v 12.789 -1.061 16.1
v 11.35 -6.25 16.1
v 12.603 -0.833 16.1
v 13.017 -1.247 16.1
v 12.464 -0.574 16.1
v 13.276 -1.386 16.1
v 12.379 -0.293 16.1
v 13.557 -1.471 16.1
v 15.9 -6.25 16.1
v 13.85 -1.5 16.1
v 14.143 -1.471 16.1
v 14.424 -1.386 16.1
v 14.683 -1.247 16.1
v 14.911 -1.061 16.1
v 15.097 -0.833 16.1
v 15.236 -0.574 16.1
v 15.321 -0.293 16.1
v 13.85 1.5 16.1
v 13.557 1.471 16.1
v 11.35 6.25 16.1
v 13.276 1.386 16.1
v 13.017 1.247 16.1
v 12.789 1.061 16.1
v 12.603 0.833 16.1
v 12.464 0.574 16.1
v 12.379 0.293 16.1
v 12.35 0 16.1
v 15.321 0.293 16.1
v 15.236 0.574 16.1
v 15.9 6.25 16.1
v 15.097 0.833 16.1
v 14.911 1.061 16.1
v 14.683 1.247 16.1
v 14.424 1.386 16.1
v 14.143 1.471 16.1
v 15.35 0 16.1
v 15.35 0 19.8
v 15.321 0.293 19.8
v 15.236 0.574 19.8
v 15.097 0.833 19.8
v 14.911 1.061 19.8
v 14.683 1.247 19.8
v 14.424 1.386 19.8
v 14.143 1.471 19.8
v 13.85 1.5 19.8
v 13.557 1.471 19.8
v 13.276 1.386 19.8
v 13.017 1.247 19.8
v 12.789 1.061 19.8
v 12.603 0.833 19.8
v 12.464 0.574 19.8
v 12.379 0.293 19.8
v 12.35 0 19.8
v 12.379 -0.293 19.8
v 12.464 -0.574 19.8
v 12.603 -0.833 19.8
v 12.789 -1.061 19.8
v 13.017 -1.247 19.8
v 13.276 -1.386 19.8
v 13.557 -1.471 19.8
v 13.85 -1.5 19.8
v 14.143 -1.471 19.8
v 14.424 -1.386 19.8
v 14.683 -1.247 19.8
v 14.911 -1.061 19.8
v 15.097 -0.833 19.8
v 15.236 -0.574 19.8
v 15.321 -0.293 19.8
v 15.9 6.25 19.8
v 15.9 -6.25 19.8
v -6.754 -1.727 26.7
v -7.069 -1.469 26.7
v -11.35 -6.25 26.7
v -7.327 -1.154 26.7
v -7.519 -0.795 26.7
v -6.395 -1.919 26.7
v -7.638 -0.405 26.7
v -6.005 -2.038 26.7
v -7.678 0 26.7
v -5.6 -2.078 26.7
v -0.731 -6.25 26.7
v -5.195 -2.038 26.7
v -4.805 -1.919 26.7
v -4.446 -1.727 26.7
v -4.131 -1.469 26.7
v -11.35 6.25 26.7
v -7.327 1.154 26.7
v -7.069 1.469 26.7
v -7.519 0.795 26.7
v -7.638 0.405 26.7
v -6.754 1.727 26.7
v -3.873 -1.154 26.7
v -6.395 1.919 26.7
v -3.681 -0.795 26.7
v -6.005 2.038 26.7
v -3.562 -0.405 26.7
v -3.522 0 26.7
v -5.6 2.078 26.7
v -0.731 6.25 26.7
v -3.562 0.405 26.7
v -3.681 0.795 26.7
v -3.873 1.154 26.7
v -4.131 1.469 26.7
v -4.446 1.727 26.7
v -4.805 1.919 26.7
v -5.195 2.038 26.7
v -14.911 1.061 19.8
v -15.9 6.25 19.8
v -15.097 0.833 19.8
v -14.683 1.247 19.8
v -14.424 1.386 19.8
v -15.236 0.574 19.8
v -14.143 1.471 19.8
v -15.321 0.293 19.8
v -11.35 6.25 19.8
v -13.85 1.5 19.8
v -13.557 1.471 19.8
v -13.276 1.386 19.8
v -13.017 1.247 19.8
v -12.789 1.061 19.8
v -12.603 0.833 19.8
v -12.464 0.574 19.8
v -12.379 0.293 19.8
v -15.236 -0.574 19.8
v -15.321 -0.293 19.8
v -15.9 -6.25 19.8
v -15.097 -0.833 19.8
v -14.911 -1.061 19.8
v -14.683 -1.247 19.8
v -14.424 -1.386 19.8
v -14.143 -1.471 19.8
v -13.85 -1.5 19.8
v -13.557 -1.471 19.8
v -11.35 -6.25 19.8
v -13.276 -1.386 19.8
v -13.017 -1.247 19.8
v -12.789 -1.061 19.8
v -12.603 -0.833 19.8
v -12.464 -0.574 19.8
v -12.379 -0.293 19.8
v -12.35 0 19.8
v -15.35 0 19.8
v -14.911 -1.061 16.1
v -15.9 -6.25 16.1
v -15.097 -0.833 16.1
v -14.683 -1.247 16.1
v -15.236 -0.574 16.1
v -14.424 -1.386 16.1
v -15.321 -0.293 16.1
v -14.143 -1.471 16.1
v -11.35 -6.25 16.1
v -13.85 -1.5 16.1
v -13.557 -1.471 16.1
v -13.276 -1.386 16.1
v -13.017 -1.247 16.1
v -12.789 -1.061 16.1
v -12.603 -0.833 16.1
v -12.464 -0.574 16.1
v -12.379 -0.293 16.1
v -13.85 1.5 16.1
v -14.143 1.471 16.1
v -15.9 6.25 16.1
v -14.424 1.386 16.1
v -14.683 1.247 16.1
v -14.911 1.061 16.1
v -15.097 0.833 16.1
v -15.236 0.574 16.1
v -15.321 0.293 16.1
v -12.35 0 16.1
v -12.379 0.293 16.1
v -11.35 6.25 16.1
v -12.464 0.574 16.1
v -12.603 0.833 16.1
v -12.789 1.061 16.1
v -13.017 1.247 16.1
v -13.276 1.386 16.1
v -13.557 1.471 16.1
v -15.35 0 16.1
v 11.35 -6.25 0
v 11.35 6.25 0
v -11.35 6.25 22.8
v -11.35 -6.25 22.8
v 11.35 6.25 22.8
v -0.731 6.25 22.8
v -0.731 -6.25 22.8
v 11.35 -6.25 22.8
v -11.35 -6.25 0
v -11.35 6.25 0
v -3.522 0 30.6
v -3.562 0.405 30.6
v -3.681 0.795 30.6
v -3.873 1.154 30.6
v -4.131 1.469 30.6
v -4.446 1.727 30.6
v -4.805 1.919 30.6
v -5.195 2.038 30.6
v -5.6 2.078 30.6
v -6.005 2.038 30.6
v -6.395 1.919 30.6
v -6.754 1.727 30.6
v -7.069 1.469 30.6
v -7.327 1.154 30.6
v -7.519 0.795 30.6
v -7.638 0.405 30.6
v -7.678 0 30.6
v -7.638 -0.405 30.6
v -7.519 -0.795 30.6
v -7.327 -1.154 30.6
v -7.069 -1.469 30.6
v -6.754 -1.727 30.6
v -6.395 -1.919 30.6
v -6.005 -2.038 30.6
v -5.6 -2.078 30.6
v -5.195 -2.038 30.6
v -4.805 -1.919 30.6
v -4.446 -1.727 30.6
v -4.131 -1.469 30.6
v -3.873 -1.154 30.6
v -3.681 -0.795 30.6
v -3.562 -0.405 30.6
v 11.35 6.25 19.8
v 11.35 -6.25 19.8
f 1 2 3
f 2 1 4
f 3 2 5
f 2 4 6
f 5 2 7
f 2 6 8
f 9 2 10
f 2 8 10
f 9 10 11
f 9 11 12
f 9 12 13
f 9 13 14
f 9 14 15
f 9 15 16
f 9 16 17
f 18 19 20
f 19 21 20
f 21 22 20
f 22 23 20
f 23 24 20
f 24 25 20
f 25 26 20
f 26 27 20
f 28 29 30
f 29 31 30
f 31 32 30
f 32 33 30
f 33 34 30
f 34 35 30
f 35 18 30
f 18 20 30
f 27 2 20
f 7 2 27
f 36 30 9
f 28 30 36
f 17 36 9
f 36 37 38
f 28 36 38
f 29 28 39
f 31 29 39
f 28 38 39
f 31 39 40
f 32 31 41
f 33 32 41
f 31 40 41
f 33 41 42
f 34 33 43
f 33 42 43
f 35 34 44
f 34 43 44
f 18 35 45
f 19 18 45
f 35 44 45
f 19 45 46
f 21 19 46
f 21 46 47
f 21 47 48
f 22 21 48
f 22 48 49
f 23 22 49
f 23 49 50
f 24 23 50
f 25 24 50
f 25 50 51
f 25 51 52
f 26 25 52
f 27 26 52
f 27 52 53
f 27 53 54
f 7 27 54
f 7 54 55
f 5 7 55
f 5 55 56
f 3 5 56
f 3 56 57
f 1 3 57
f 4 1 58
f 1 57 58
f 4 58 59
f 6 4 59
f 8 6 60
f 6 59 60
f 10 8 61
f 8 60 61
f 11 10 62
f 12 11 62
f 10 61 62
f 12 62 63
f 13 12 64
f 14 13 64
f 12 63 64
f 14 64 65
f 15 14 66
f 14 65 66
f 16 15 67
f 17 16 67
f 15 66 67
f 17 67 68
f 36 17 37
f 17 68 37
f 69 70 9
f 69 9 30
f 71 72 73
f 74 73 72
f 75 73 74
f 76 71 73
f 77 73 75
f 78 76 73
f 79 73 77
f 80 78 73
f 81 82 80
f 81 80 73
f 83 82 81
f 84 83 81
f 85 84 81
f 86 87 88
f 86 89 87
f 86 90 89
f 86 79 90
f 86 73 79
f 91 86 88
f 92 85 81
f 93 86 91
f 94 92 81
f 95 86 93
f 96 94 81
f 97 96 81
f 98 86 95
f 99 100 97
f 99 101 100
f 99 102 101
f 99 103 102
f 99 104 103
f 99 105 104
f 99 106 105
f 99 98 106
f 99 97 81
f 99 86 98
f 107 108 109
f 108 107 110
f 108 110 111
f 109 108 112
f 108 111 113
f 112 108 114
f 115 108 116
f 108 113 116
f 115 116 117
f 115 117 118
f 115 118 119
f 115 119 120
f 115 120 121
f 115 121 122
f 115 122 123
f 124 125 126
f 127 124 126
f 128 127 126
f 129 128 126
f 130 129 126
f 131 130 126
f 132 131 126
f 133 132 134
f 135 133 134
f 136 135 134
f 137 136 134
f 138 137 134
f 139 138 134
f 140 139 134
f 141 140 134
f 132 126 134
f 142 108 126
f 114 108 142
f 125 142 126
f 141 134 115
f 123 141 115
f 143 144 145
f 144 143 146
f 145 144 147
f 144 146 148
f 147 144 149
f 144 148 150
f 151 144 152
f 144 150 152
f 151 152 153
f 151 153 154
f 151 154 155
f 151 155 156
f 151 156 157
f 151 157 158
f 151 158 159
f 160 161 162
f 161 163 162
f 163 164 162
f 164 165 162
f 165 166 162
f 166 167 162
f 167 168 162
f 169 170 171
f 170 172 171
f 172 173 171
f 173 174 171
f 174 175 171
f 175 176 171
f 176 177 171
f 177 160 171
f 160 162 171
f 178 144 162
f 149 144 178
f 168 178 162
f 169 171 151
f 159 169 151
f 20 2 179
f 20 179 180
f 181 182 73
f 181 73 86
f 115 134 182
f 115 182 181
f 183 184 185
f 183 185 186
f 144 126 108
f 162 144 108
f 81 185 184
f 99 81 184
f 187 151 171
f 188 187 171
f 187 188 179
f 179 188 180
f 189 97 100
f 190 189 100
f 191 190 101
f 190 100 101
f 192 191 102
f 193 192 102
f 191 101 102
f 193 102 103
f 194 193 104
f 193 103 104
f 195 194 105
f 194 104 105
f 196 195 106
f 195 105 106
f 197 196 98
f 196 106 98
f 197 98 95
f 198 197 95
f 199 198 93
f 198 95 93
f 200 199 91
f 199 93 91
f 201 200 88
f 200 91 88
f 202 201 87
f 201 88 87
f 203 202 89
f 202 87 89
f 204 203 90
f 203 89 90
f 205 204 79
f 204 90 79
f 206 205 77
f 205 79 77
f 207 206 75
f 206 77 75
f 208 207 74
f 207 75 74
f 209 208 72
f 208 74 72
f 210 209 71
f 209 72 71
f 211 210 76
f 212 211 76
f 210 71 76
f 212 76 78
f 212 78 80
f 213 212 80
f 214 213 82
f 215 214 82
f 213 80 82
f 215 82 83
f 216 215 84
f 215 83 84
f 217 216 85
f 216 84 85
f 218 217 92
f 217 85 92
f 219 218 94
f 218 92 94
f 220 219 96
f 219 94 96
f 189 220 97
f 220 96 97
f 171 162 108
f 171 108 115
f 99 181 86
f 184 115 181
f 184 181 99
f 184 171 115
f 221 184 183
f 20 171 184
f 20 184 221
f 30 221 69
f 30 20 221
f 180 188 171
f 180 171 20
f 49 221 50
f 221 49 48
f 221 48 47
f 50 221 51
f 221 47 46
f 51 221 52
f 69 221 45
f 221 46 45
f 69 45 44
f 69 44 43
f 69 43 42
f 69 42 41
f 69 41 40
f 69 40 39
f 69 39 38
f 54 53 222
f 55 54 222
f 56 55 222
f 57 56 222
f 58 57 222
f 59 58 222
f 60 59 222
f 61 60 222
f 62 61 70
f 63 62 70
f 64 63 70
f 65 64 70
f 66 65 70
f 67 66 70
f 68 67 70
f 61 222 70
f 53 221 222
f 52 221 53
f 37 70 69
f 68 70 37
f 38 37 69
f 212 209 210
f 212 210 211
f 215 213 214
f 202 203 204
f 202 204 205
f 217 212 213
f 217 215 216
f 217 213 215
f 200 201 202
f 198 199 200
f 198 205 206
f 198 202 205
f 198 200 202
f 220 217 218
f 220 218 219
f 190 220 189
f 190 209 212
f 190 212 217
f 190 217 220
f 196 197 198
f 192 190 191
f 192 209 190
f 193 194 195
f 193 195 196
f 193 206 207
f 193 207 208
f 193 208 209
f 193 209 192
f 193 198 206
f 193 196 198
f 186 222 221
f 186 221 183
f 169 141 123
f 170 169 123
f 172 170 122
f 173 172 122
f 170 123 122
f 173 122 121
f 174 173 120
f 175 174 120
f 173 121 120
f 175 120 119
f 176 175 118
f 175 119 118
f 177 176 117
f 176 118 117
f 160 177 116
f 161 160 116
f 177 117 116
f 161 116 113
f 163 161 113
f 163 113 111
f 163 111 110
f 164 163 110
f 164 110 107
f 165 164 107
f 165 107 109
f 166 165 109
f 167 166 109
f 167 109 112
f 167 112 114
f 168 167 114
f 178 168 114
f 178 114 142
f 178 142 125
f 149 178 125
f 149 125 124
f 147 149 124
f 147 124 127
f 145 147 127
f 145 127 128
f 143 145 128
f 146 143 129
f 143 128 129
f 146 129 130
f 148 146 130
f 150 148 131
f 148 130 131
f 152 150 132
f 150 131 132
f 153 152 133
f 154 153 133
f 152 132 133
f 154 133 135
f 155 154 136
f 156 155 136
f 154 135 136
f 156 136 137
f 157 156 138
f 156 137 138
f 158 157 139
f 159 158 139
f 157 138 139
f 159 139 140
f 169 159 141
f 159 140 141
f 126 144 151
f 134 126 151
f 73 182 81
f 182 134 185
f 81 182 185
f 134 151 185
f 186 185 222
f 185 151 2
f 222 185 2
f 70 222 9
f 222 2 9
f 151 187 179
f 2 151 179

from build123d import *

# Parameters (mm, degrees)
SKETCH1_W           = 22.7
SKETCH1_H           = 12.5
BOSS_EXTRUDE1_DEPTH = 22.8
SKETCH2_W           = 4.55
SKETCH2_H           = 12.5
BOSS_EXTRUDE2_DEPTH = 6.7
SKETCH3_W           = 4.55
SKETCH3_H           = 3
CUT_EXTRUDE1_DEPTH  = 13.5
SKETCH4_R           = 1.5
CUT_EXTRUDE2_DEPTH  = 16.1
SKETCH6_W           = 10.618713929
SKETCH6_H           = 12.5
BOSS_EXTRUDE4_DEPTH = 3.9
SKETCH8_R           = 2.077581334
BOSS_EXTRUDE5_DEPTH = 3.9


with BuildPart() as part:
    # Sketch1 → Boss-Extrude1 (new body)
    with BuildSketch(Plane.XY):
        Rectangle(SKETCH1_W, SKETCH1_H)
    extrude(amount=BOSS_EXTRUDE1_DEPTH)

    # Sketch2 → Boss-Extrude2 (add)
    with BuildSketch(Plane.XY.offset(22.8)):
        with Locations((-13.625, 0)):
            Rectangle(SKETCH2_W, SKETCH2_H)
        with Locations((13.625, 0)):
            Rectangle(SKETCH2_W, SKETCH2_H)
    extrude(amount=-BOSS_EXTRUDE2_DEPTH)

    # Sketch3 → Cut-Extrude1 (cut, through all)
    with BuildSketch(Plane.XZ.offset(6.25)):
        with Locations((-13.625, 21.3)):
            Rectangle(SKETCH3_W, SKETCH3_H)
        with Locations((13.625, 21.3)):
            Rectangle(SKETCH3_W, SKETCH3_H)
    extrude(amount=-CUT_EXTRUDE1_DEPTH, mode=Mode.SUBTRACT)

    # Sketch4 → Cut-Extrude2 (cut)
    with BuildSketch(Plane.XY.offset(19.8)):
        with Locations((13.85, 0)):
            Circle(SKETCH4_R)
        with Locations((-13.85, 0)):
            Circle(SKETCH4_R)
    extrude(amount=-CUT_EXTRUDE2_DEPTH, mode=Mode.SUBTRACT)

    # Sketch6 → Boss-Extrude4 (add)
    with BuildSketch(Plane.XY.offset(22.8)):
        with Locations((-6.040643036, 0)):
            Rectangle(SKETCH6_W, SKETCH6_H)
    extrude(amount=BOSS_EXTRUDE4_DEPTH)

    # Sketch8 → Boss-Extrude5 (add)
    with BuildSketch(Plane.XY.offset(26.7)):
        with Locations((-5.6, 0)):
            Circle(SKETCH8_R)
    extrude(amount=BOSS_EXTRUDE5_DEPTH)


solid = part.part
